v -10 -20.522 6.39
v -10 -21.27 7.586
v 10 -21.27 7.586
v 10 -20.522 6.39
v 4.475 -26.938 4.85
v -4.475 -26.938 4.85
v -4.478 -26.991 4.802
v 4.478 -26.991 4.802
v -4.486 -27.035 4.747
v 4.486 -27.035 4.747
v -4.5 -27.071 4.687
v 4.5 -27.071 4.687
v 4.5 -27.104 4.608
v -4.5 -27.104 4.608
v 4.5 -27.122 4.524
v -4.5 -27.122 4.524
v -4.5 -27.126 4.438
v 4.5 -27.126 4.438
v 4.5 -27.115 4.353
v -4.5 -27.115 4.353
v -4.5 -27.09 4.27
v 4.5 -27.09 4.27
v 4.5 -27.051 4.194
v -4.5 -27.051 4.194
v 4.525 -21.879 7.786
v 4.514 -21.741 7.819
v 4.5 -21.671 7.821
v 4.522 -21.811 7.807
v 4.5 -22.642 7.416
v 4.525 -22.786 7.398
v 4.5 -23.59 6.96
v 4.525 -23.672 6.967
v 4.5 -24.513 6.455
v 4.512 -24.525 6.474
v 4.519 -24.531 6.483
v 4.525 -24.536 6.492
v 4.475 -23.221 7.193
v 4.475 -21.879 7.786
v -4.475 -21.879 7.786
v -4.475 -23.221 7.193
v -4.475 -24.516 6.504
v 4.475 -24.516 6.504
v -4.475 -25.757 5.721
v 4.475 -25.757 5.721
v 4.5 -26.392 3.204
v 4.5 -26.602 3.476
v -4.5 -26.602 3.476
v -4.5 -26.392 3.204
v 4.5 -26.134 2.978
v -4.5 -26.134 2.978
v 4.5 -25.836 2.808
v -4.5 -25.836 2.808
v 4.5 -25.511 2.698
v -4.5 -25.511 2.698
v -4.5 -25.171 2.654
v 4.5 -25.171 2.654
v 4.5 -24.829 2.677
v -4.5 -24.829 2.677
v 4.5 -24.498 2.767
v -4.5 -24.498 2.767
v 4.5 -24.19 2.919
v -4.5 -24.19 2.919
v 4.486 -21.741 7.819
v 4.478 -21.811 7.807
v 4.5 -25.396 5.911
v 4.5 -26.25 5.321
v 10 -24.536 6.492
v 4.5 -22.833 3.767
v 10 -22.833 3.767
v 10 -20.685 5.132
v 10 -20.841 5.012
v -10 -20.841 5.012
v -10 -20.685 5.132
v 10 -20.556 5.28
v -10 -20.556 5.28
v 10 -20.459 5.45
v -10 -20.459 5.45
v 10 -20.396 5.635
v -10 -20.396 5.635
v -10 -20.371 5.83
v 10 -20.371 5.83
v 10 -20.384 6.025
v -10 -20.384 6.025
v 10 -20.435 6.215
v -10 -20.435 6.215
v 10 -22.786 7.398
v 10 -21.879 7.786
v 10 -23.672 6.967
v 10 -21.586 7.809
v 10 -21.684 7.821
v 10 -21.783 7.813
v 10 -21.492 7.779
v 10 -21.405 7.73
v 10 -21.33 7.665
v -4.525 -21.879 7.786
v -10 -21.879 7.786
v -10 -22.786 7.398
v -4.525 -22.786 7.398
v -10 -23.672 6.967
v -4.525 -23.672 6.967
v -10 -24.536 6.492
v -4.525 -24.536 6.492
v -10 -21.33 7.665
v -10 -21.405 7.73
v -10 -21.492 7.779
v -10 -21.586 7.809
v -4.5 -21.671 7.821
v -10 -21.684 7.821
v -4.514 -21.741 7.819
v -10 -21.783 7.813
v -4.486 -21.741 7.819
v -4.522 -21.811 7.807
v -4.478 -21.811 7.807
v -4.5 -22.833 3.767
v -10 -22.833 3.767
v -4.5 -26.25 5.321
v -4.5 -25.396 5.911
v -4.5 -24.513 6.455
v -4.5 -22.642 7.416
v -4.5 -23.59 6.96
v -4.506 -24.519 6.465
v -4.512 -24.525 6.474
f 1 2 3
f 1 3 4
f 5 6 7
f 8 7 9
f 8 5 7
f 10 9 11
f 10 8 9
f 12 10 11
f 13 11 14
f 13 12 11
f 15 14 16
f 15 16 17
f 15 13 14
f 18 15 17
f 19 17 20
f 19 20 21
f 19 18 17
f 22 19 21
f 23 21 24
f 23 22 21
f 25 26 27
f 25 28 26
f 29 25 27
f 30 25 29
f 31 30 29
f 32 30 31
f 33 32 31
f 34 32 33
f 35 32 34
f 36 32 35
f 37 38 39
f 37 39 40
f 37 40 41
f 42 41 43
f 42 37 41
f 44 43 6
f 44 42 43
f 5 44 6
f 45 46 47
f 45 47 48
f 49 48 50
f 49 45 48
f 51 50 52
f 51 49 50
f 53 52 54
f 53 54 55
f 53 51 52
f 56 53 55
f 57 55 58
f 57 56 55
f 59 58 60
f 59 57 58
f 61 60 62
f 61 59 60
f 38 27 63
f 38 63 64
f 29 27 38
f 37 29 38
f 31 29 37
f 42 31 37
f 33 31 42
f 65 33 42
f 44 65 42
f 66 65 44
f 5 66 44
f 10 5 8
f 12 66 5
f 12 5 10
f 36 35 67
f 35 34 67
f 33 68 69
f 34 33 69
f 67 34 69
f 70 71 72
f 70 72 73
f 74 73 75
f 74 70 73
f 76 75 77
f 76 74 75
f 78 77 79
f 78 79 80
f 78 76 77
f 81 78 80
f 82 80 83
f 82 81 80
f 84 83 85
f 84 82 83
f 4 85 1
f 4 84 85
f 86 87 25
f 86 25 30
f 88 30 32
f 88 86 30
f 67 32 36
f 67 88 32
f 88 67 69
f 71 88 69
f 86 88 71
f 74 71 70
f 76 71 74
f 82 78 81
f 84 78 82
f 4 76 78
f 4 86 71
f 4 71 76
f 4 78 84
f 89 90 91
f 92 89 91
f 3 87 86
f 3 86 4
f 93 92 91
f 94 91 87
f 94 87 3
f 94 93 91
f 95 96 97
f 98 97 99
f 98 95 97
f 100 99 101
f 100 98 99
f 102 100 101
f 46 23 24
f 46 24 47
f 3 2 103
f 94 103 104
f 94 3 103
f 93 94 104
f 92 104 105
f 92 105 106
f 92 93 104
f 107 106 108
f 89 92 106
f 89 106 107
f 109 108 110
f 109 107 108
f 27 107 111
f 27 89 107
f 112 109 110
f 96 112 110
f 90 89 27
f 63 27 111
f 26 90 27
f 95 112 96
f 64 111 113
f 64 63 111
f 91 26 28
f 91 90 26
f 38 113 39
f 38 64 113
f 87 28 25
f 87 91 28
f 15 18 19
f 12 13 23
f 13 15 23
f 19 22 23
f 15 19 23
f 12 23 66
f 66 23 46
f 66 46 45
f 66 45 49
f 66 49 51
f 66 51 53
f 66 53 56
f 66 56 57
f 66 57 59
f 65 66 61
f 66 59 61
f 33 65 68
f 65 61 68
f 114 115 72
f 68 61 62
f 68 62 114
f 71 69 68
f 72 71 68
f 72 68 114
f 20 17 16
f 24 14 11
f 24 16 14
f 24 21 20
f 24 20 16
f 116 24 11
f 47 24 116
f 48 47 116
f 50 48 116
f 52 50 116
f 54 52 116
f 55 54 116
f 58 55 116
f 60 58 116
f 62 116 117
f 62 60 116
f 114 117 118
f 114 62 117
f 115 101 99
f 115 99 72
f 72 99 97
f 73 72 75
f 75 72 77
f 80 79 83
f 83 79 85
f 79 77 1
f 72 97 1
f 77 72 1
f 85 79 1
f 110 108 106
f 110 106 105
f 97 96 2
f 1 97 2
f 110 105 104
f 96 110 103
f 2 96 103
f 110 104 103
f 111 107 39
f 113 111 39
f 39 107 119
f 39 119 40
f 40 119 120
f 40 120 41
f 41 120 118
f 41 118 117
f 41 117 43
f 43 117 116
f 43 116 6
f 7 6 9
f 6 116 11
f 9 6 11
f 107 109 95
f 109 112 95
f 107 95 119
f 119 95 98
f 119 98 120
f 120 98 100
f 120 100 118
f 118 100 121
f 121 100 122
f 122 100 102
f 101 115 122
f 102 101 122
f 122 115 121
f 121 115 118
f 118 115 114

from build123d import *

# Parameters (mm, degrees)
PAD012_DEPTH    = 10
SKETCH061_W     = 3.35
SKETCH061_H     = 5.5
POCKET011_DEPTH = 5.7141437505


with BuildPart() as part:
    # Sketch059 → Pad012 (new body, symmetric)
    with BuildSketch(Plane.YZ):
        with BuildLine():
            ThreePointArc((-21.8787366497, 7.7856764323), (-24.5162755283, 6.5038208287), (-26.9380130719, 4.8500516808))
            ThreePointArc((-26.9380130719, 4.8500516808), (-27.1193333278, 4.5434596832), (-27.0505550432, 4.1939668567))
            Line((-27.0505550432, 4.1939668567), (-26.6017940465, 3.4757991384))
            ThreePointArc((-26.6017940465, 3.4757991384), (-25.5113742234, 2.6980102375), (-24.1903511659, 2.9190736826))
            Line((-24.1903511659, 2.9190736826), (-20.840561186, 5.0122547763))
            ThreePointArc((-20.840561186, 5.0122547763), (-20.3961103855, 5.6353518181), (-20.5224323541, 6.3902221367))
            Line((-21.2697124354, 7.5861202536), (-20.5224323541, 6.3902221367))
            ThreePointArc((-21.2697124354, 7.5861202536), (-21.5380484263, 7.7963039987), (-21.8787366497, 7.7856764323))
        make_face()
    extrude(amount=PAD012_DEPTH, both=True)

    # Sketch061 (on Face6 of Pad012) → Pocket011 (cut, through all)
    with BuildSketch(Plane(origin=(0, -8.1048226153, 12.9704274831), x_dir=(0, 0.8480480962, 0.5299192642), z_dir=(0, 0.5299192642, -0.8480480962))):
        with Locations((-19.0427078734, 7.25)):
            Rectangle(SKETCH061_W, SKETCH061_H)
        with Locations((-19.0427078734, -7.25)):
            Rectangle(SKETCH061_W, SKETCH061_H)
    extrude(amount=-POCKET011_DEPTH, mode=Mode.SUBTRACT)

    # SubtractivePipe002: sweep along a path in Sketch063
    with BuildLine(Plane.YZ.offset(4.5)) as subtractivepipe002_path:
        ThreePointArc((-21.4885664226, 7.9363598462), (-24.5285349663, 6.4967015301), (-27.284244153, 4.5679476082))
    # Sketch062 (on DatumPlane) → SubtractivePipe002 (sweep, cut)
    with BuildSketch(Plane(origin=(4.5, -26.9380130719, 4.8500516808), x_dir=(0, -0.6229641536, 0.782250384), z_dir=(0, -0.782250384, -0.6229641536))):
        Polygon((0, -0.025), (0, 0.025), (-0.0433012702, 0), align=None)
    subtractivepipe002 = sweep(path=subtractivepipe002_path.line, mode=Mode.SUBTRACT)

    # Mirrored002: SubtractivePipe002 across YZ
    add(subtractivepipe002.mirror(Plane.YZ), mode=Mode.SUBTRACT)


solid = part.part
